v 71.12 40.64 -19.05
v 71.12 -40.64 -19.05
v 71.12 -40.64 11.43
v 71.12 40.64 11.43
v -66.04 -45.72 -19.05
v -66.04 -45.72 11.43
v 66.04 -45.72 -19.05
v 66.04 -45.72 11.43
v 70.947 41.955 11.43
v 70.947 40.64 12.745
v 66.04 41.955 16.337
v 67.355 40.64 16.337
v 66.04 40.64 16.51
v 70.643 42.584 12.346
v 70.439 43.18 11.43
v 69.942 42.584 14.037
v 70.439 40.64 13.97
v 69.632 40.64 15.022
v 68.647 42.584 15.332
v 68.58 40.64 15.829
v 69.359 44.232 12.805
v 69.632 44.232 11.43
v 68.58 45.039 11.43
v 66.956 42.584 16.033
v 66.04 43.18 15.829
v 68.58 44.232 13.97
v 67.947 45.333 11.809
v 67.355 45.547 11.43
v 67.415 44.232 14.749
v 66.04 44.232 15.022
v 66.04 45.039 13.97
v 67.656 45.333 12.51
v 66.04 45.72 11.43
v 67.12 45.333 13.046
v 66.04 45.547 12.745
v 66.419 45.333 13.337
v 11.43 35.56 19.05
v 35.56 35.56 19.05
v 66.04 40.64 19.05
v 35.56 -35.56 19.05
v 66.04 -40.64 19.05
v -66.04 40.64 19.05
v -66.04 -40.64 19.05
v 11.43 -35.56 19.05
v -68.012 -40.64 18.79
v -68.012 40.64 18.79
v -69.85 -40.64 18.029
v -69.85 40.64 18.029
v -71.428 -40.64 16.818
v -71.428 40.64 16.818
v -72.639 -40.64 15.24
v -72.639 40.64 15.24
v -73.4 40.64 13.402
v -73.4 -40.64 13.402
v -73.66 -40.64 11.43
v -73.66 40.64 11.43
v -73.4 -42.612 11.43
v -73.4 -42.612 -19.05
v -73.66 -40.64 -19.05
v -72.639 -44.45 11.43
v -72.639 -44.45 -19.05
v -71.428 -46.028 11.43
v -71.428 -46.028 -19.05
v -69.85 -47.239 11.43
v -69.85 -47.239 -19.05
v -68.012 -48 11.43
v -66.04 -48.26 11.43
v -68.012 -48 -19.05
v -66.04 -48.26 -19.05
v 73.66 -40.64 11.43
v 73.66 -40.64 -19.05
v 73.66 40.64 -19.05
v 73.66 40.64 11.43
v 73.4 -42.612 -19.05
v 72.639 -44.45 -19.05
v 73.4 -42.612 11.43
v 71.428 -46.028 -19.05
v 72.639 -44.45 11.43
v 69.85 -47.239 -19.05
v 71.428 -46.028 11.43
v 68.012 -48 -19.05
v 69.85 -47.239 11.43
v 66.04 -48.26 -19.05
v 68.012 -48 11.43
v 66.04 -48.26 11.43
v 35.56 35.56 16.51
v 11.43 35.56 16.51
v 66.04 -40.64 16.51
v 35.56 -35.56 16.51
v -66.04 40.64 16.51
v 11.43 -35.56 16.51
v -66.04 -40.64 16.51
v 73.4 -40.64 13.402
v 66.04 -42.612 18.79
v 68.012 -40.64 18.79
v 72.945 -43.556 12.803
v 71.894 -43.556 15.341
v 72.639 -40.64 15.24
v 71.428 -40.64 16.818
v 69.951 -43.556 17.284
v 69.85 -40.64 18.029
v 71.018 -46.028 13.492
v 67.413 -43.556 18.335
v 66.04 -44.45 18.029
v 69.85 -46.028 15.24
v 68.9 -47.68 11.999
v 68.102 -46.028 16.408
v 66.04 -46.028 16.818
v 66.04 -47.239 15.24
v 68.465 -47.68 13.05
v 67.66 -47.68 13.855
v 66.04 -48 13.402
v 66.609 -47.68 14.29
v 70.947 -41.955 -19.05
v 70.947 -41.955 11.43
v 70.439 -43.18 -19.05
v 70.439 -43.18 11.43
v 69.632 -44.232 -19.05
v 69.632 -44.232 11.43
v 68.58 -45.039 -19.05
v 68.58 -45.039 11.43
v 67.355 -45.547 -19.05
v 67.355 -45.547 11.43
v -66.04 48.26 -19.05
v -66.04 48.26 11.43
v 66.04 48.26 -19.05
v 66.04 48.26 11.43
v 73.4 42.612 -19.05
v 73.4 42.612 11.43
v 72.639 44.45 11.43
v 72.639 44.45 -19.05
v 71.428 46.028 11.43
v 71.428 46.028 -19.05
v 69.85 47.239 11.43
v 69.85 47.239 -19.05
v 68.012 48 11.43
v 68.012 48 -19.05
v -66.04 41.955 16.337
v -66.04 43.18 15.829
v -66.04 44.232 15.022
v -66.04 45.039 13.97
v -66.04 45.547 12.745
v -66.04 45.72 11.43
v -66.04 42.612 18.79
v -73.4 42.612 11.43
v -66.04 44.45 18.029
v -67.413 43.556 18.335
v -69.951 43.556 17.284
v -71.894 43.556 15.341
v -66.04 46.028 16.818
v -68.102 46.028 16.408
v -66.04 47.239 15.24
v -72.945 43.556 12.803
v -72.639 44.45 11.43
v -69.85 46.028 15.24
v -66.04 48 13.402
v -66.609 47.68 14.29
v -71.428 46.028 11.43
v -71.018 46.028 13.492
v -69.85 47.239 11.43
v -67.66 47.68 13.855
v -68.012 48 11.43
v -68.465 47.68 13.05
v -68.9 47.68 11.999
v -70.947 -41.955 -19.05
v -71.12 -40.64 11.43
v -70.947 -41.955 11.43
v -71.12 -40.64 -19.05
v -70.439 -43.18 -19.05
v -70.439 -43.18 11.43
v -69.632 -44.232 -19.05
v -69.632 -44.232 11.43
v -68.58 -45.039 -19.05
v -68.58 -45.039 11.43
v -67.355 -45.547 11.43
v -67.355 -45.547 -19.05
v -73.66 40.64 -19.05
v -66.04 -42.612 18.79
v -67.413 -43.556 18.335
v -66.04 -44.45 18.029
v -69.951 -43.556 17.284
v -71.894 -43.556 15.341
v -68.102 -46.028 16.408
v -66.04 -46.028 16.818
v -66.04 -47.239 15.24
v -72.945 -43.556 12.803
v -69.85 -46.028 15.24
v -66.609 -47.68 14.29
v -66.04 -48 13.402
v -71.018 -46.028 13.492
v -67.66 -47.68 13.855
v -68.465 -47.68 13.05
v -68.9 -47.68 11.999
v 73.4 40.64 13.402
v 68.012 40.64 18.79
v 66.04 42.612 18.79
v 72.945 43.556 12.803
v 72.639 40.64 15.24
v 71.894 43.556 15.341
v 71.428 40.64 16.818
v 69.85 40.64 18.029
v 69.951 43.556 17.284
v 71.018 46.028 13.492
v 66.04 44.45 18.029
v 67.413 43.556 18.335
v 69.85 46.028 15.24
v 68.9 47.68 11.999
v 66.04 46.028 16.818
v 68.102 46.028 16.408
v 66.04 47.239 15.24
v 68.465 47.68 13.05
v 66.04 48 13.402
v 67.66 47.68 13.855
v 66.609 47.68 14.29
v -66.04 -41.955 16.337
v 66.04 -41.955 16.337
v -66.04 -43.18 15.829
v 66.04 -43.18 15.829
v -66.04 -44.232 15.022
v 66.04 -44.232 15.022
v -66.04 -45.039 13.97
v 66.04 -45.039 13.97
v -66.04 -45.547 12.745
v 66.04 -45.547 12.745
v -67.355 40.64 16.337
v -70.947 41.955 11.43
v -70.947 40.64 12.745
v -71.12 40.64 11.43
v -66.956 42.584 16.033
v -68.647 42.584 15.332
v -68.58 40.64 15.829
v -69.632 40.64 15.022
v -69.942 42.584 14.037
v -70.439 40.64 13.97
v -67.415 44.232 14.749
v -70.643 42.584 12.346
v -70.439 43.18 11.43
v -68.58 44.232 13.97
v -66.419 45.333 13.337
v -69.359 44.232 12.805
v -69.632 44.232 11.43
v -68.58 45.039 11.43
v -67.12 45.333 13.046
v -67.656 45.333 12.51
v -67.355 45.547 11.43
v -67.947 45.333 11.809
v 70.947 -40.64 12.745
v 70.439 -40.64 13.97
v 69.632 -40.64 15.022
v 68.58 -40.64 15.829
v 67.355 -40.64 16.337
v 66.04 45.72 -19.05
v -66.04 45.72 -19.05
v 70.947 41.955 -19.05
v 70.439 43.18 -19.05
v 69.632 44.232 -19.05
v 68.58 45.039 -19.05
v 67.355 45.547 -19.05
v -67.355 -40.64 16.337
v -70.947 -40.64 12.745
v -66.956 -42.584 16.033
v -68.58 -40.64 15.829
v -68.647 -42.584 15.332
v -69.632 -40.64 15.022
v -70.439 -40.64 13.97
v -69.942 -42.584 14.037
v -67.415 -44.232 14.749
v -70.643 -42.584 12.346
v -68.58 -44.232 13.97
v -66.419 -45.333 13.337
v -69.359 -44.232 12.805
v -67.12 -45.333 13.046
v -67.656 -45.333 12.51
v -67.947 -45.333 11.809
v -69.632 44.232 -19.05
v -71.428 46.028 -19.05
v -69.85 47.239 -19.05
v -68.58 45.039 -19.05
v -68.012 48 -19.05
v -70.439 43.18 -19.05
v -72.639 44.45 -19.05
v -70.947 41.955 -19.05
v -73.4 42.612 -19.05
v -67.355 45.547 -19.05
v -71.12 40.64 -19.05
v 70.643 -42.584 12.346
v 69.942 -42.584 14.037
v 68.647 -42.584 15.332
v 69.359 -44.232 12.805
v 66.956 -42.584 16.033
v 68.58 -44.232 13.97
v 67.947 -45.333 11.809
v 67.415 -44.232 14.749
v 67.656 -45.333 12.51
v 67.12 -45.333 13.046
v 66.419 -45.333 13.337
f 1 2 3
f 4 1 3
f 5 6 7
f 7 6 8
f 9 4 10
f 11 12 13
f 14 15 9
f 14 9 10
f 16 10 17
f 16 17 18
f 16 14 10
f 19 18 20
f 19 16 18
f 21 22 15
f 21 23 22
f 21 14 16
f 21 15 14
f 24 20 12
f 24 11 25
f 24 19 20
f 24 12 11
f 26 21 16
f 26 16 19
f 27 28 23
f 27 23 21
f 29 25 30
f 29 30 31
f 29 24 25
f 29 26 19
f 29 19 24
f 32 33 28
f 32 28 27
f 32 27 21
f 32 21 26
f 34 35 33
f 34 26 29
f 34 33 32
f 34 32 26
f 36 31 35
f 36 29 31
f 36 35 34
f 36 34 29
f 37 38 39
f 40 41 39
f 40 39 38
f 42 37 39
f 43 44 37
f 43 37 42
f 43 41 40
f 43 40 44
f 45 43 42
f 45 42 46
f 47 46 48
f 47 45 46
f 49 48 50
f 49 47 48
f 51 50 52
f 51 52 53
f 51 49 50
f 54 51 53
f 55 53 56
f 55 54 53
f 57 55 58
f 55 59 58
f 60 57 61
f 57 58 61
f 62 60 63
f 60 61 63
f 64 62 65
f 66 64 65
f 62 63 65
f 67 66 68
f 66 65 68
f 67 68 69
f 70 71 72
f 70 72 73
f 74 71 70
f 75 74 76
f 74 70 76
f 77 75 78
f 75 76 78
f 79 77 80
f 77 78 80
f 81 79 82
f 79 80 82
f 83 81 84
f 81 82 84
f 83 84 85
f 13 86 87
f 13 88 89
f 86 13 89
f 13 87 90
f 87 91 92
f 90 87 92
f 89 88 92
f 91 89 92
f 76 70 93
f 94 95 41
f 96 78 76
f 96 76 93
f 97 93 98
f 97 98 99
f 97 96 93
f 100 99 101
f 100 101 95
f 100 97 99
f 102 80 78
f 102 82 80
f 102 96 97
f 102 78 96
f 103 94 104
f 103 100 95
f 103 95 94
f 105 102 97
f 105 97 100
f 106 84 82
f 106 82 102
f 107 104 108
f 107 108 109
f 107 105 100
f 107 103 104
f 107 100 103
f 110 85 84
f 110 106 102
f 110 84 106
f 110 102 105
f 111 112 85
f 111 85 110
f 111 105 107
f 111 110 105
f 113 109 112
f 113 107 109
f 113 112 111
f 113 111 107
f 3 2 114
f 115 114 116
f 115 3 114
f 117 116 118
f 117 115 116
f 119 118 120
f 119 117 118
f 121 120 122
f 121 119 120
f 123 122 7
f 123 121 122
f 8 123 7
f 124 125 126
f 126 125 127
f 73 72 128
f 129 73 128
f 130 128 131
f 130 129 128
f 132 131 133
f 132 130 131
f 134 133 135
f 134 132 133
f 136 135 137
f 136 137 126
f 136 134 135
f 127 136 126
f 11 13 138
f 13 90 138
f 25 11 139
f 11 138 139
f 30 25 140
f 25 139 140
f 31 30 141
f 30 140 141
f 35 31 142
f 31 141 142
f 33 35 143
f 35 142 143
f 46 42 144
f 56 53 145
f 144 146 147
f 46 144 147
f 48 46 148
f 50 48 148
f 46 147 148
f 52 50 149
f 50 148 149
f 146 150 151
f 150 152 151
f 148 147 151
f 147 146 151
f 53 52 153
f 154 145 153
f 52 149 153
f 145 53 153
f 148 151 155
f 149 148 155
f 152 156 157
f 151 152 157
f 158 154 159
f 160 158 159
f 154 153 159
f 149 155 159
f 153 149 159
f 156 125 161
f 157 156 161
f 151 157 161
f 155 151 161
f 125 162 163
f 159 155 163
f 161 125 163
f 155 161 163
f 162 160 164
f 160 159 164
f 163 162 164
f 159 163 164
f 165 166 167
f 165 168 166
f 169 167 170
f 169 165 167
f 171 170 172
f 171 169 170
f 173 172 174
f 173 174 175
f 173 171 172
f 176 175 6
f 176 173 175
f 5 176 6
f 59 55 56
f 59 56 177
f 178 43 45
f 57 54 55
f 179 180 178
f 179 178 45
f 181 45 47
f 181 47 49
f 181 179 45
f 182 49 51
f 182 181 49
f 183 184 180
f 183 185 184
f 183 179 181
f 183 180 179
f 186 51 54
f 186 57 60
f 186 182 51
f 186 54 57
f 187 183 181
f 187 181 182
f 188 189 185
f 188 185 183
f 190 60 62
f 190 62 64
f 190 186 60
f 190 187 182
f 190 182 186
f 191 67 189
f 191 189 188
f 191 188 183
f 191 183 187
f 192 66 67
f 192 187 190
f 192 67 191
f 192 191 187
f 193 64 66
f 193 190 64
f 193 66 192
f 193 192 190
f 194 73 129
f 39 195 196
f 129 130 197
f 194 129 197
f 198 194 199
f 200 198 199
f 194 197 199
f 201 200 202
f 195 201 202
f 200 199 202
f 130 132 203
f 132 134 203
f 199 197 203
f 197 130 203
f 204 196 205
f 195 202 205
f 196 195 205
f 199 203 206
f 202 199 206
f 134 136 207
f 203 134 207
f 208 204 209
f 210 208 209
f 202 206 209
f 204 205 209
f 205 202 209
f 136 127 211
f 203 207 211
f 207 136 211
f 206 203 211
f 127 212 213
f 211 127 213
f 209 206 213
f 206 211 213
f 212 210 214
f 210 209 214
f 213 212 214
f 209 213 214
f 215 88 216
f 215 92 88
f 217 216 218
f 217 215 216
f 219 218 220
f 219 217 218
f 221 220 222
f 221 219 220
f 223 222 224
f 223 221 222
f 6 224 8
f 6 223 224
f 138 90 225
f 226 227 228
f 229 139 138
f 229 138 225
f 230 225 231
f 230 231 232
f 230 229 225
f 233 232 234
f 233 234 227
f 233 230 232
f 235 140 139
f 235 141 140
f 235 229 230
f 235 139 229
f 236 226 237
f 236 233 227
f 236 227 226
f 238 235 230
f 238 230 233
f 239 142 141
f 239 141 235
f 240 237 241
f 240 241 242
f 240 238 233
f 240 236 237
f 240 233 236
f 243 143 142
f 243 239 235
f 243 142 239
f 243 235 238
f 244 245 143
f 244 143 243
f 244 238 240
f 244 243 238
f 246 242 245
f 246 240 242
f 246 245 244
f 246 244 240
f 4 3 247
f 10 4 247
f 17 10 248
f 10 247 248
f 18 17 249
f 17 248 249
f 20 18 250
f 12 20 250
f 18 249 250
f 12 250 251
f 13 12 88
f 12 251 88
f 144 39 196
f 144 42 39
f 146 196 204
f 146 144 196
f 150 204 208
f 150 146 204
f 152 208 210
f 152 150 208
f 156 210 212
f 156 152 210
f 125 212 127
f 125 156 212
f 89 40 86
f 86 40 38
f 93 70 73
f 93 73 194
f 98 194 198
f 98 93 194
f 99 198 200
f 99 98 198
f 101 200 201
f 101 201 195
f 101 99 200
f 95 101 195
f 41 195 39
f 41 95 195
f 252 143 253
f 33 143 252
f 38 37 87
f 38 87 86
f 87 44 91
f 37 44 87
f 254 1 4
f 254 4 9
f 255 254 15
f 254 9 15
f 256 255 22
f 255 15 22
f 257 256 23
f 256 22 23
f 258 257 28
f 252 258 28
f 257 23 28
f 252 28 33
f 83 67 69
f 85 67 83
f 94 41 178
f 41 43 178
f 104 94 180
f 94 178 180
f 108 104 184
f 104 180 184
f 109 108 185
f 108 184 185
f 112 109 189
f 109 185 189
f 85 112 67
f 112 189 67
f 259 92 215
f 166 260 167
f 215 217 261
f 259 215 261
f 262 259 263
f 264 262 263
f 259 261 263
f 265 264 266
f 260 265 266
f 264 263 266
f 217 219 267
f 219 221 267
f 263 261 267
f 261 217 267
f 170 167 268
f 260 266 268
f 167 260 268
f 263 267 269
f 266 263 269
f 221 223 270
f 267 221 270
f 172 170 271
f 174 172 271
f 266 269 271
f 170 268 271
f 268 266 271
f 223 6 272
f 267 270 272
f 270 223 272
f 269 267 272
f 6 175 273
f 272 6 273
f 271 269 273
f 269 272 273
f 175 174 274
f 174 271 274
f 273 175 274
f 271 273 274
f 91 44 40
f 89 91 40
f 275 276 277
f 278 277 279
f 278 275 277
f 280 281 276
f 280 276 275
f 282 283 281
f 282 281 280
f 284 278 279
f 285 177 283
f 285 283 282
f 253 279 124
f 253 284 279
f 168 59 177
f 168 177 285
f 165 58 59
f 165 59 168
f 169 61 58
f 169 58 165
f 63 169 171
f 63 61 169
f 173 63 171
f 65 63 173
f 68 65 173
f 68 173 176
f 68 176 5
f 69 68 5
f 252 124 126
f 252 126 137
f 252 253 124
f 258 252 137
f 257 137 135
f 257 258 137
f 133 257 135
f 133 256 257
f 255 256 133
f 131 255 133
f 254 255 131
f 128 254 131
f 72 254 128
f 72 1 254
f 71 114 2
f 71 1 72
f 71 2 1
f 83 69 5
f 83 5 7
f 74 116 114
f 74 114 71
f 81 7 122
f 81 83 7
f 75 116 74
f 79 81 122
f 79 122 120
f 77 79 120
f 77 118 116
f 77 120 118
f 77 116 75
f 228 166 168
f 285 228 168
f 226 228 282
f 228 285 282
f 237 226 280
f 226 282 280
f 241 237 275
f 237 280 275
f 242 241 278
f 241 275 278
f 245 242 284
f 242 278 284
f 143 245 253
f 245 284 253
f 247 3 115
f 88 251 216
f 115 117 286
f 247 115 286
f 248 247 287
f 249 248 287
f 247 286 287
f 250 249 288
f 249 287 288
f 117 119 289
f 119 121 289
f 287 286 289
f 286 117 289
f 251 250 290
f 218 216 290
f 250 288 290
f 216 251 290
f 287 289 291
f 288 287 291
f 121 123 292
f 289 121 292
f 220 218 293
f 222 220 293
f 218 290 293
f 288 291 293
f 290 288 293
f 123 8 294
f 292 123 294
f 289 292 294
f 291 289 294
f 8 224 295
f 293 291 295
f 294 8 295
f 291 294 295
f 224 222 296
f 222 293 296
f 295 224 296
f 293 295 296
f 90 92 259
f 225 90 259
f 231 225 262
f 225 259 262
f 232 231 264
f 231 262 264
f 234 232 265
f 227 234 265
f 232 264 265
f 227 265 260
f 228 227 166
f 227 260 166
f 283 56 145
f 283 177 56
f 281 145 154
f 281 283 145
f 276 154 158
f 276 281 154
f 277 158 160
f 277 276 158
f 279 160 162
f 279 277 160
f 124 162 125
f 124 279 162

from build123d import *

# Parameters (mm, degrees)
F1_DEPTH = 48.26
F2_R     = 7.62
F3_R     = 7.62
F4_T     = -2.54
F5_W     = 24.13
F5_H     = 71.12
F6_DEPTH = 2.54


with BuildPart() as f1:
    # F0 (on Front) → F1 (new body, symmetric)
    with BuildSketch(Plane.XZ):
        with BuildLine():
            ThreePointArc((73.66, 11.43), (71.4281536726, 16.8181536726), (66.04, 19.05))
            Line((66.04, 19.05), (-66.04, 19.05))
            ThreePointArc((-66.04, 19.05), (-71.4281536726, 16.8181536726), (-73.66, 11.43))
            Line((-73.66, 11.43), (-73.66, -19.05))
            Line((-73.66, -19.05), (73.66, -19.05))
            Line((73.66, -19.05), (73.66, 11.43))
        make_face()
    extrude(amount=F1_DEPTH, both=True)

    # F2
    f2_edges = [f1.edges().sort_by_distance(p)[0] for p in [
        (66.04, 0, 19.05),
        (-66.04, 0, 19.05),
        (71.428154, 48.26, 16.818154),
    ]]
    fillet(f2_edges, radius=F2_R)

    # F3
    f3_edges = [f1.edges().sort_by_distance(p)[0] for p in [
        (66.04, -3.81, 19.05),
        (71.428154, -48.26, 16.818154),
    ]]
    fillet(f3_edges, radius=F3_R)

    # F4
    f4_openings = [f1.faces().sort_by_distance(p)[0] for p in [
        (0, 0, -19.05),
    ]]
    offset(amount=F4_T, openings=f4_openings)

    # F5 (on face) → F6 (cut, through all)
    with BuildSketch(Plane.XY.offset(19.05)):
        with Locations((23.495, 0)):
            Rectangle(F5_W, F5_H)
    extrude(amount=-F6_DEPTH, mode=Mode.SUBTRACT)


solid = f1.part
